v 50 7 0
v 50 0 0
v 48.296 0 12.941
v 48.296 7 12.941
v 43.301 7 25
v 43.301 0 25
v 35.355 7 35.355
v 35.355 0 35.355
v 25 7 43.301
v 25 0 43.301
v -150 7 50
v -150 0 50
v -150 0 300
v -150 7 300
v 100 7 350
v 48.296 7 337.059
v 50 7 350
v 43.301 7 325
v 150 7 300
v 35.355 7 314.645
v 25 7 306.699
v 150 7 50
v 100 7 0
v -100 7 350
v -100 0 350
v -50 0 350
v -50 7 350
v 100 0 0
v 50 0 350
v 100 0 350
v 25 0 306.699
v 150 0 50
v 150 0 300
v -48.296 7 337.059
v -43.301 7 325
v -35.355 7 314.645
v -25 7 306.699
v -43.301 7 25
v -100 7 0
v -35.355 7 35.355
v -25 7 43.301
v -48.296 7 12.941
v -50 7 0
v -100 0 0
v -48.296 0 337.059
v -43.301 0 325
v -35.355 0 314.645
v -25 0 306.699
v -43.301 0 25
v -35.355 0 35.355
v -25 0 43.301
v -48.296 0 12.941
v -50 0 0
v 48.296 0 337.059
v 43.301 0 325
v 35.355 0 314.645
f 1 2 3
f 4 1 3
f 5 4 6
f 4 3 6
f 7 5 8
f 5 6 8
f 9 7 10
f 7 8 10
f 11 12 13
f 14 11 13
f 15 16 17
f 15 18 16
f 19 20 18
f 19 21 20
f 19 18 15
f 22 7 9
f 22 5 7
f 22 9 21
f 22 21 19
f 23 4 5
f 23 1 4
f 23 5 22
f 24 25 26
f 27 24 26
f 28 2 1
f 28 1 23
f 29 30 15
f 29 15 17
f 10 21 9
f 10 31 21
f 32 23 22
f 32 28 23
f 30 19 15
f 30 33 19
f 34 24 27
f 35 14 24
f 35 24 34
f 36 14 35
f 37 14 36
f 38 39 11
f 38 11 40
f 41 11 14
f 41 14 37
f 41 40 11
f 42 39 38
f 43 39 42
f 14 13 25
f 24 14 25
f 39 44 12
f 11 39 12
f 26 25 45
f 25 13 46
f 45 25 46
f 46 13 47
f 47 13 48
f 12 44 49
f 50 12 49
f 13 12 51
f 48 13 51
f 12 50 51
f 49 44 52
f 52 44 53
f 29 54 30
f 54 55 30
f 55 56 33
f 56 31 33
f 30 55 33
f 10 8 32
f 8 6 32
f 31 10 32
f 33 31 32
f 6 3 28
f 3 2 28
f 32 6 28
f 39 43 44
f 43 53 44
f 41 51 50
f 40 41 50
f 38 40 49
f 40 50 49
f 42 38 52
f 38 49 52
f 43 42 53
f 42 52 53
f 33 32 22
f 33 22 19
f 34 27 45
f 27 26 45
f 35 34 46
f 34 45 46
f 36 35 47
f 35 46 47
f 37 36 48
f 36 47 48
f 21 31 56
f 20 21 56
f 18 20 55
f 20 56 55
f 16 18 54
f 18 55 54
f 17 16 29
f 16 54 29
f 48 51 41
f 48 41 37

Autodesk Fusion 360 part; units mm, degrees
sketch "Sketch1" plane through (0, 0, 0) normal (0, 1, 0) x (1, 0, 0)
  line L0 (-50, 0) -> (-100, 0)
  line L1 (-150, -300) -> (-100, -350)
  arc A0 (50, -350) -> (0, -300) centre (0, -350) ccw
  arc A1 (0, -300) -> (-50, -350) centre (0, -350) ccw
  line L2 (100, 0) -> (150, -50)
  line L3 (-100, -350) -> (-50, -350)
  line L4 (-150, -50) -> (-150, -300)
  line L5 (150, -50) -> (150, -300)
  line L6 (-100, 0) -> (-150, -50)
  line L7 (100, -350) -> (50, -350)
  line L8 (50, 0) -> (100, 0)
  line L9 (150, -300) -> (100, -350)
  arc A2 (-50, 0) -> (0, -50) centre (0, 0) ccw
  arc A3 (0, -50) -> (50, 0) centre (0, 0) ccw
  point P0 (0, -175)
  dimension "d1" = 100
  dimension "d2" = 50
  dimension "d3" = 250
  dimension "d4" = 100
extrude "Extrude1" add sketch "Sketch1" along normal blind 7 makes body 1
sketch "Sketch2" plane through (0, 0, 0) normal (0, -1, 0) x (1, 0, 0)
  line L0 (-100, 0) -> (-50, 0)
  arc A0 (50, 0) -> (-50, 0) centre (0, 0) ccw
  line L1 (50, 0) -> (100, 0)
  line L2 (100, 0) -> (150, 50)
  line L3 (150, 50) -> (150, 300)
  line L4 (150, 300) -> (100, 350)
  line L5 (100, 350) -> (50, 350)
  arc A1 (-50, 350) -> (50, 350) centre (0, 350) ccw
  line L6 (-50, 350) -> (-100, 350)
  line L7 (-100, 350) -> (-150, 300)
  line L8 (-150, 300) -> (-150, 50)
  line L9 (-150, 50) -> (-100, 0)
  line L10 (-25, 350) -> (25, 350)
  line L11 (25, 350) -> (25, 0)
  line L12 (25, 0) -> (-25, 0)
  line L13 (-25, 0) -> (-25, 350)
  line L14 (-25, 350) -> (25, 0) construction
  line L15 (25, 350) -> (-25, 0) construction
  point P0 (0, 175)
  point P1 (0, 175)
  dimension "d10" = 50
  dimension "d11" = 350
extrude "Extrude2" cut sketch "Sketch2" against normal blind 7 contours A0 A1 L11 L13 | A0 L11 L12 L13 | A1 L10 L11 L13 bodies 1 makes body 2 at (66.6667, 7, 216.6667)
sketch "Sketch3" plane through (0, 0, 350) normal (0, 0, 1) x (-1, 0, 0)
  line L0 (-50, 0) -> (-100, 0)
  line L1 (-100, 0) -> (-100, -7)
  line L2 (-100, -7) -> (-50, -7)
  line L3 (-50, -7) -> (-50, 0)
  line L4 (-50, -3.5) -> (50, -3.5)
  point P0 (0, -3.5)
sketch "Sketch4" plane through (0, 0, 0) normal (1, 0, 0) x (0, 1, 0)
  line L0 (3.5, 350) -> (-50.9682, 342.3702) construction
  line L1 (3.5, 350) -> (58.5, 350) construction
  point P0 (3.5, 350)
  dimension "d15" = 172.026
  dimension "d16" = 55
ref_plane "WorkPlane1" through (0, -23.7341, 346.1851) normal (0, -0.1387, 0.9903) x (0, -0.9903, -0.1387)
sketch "Sketch5" plane through (0, 0, 0) normal (0, 1, 0) x (1, 0, 0)
chamfer "Chamfer1" [suppressed]
equation "d15 = 180 deg - 7.974 deg"
